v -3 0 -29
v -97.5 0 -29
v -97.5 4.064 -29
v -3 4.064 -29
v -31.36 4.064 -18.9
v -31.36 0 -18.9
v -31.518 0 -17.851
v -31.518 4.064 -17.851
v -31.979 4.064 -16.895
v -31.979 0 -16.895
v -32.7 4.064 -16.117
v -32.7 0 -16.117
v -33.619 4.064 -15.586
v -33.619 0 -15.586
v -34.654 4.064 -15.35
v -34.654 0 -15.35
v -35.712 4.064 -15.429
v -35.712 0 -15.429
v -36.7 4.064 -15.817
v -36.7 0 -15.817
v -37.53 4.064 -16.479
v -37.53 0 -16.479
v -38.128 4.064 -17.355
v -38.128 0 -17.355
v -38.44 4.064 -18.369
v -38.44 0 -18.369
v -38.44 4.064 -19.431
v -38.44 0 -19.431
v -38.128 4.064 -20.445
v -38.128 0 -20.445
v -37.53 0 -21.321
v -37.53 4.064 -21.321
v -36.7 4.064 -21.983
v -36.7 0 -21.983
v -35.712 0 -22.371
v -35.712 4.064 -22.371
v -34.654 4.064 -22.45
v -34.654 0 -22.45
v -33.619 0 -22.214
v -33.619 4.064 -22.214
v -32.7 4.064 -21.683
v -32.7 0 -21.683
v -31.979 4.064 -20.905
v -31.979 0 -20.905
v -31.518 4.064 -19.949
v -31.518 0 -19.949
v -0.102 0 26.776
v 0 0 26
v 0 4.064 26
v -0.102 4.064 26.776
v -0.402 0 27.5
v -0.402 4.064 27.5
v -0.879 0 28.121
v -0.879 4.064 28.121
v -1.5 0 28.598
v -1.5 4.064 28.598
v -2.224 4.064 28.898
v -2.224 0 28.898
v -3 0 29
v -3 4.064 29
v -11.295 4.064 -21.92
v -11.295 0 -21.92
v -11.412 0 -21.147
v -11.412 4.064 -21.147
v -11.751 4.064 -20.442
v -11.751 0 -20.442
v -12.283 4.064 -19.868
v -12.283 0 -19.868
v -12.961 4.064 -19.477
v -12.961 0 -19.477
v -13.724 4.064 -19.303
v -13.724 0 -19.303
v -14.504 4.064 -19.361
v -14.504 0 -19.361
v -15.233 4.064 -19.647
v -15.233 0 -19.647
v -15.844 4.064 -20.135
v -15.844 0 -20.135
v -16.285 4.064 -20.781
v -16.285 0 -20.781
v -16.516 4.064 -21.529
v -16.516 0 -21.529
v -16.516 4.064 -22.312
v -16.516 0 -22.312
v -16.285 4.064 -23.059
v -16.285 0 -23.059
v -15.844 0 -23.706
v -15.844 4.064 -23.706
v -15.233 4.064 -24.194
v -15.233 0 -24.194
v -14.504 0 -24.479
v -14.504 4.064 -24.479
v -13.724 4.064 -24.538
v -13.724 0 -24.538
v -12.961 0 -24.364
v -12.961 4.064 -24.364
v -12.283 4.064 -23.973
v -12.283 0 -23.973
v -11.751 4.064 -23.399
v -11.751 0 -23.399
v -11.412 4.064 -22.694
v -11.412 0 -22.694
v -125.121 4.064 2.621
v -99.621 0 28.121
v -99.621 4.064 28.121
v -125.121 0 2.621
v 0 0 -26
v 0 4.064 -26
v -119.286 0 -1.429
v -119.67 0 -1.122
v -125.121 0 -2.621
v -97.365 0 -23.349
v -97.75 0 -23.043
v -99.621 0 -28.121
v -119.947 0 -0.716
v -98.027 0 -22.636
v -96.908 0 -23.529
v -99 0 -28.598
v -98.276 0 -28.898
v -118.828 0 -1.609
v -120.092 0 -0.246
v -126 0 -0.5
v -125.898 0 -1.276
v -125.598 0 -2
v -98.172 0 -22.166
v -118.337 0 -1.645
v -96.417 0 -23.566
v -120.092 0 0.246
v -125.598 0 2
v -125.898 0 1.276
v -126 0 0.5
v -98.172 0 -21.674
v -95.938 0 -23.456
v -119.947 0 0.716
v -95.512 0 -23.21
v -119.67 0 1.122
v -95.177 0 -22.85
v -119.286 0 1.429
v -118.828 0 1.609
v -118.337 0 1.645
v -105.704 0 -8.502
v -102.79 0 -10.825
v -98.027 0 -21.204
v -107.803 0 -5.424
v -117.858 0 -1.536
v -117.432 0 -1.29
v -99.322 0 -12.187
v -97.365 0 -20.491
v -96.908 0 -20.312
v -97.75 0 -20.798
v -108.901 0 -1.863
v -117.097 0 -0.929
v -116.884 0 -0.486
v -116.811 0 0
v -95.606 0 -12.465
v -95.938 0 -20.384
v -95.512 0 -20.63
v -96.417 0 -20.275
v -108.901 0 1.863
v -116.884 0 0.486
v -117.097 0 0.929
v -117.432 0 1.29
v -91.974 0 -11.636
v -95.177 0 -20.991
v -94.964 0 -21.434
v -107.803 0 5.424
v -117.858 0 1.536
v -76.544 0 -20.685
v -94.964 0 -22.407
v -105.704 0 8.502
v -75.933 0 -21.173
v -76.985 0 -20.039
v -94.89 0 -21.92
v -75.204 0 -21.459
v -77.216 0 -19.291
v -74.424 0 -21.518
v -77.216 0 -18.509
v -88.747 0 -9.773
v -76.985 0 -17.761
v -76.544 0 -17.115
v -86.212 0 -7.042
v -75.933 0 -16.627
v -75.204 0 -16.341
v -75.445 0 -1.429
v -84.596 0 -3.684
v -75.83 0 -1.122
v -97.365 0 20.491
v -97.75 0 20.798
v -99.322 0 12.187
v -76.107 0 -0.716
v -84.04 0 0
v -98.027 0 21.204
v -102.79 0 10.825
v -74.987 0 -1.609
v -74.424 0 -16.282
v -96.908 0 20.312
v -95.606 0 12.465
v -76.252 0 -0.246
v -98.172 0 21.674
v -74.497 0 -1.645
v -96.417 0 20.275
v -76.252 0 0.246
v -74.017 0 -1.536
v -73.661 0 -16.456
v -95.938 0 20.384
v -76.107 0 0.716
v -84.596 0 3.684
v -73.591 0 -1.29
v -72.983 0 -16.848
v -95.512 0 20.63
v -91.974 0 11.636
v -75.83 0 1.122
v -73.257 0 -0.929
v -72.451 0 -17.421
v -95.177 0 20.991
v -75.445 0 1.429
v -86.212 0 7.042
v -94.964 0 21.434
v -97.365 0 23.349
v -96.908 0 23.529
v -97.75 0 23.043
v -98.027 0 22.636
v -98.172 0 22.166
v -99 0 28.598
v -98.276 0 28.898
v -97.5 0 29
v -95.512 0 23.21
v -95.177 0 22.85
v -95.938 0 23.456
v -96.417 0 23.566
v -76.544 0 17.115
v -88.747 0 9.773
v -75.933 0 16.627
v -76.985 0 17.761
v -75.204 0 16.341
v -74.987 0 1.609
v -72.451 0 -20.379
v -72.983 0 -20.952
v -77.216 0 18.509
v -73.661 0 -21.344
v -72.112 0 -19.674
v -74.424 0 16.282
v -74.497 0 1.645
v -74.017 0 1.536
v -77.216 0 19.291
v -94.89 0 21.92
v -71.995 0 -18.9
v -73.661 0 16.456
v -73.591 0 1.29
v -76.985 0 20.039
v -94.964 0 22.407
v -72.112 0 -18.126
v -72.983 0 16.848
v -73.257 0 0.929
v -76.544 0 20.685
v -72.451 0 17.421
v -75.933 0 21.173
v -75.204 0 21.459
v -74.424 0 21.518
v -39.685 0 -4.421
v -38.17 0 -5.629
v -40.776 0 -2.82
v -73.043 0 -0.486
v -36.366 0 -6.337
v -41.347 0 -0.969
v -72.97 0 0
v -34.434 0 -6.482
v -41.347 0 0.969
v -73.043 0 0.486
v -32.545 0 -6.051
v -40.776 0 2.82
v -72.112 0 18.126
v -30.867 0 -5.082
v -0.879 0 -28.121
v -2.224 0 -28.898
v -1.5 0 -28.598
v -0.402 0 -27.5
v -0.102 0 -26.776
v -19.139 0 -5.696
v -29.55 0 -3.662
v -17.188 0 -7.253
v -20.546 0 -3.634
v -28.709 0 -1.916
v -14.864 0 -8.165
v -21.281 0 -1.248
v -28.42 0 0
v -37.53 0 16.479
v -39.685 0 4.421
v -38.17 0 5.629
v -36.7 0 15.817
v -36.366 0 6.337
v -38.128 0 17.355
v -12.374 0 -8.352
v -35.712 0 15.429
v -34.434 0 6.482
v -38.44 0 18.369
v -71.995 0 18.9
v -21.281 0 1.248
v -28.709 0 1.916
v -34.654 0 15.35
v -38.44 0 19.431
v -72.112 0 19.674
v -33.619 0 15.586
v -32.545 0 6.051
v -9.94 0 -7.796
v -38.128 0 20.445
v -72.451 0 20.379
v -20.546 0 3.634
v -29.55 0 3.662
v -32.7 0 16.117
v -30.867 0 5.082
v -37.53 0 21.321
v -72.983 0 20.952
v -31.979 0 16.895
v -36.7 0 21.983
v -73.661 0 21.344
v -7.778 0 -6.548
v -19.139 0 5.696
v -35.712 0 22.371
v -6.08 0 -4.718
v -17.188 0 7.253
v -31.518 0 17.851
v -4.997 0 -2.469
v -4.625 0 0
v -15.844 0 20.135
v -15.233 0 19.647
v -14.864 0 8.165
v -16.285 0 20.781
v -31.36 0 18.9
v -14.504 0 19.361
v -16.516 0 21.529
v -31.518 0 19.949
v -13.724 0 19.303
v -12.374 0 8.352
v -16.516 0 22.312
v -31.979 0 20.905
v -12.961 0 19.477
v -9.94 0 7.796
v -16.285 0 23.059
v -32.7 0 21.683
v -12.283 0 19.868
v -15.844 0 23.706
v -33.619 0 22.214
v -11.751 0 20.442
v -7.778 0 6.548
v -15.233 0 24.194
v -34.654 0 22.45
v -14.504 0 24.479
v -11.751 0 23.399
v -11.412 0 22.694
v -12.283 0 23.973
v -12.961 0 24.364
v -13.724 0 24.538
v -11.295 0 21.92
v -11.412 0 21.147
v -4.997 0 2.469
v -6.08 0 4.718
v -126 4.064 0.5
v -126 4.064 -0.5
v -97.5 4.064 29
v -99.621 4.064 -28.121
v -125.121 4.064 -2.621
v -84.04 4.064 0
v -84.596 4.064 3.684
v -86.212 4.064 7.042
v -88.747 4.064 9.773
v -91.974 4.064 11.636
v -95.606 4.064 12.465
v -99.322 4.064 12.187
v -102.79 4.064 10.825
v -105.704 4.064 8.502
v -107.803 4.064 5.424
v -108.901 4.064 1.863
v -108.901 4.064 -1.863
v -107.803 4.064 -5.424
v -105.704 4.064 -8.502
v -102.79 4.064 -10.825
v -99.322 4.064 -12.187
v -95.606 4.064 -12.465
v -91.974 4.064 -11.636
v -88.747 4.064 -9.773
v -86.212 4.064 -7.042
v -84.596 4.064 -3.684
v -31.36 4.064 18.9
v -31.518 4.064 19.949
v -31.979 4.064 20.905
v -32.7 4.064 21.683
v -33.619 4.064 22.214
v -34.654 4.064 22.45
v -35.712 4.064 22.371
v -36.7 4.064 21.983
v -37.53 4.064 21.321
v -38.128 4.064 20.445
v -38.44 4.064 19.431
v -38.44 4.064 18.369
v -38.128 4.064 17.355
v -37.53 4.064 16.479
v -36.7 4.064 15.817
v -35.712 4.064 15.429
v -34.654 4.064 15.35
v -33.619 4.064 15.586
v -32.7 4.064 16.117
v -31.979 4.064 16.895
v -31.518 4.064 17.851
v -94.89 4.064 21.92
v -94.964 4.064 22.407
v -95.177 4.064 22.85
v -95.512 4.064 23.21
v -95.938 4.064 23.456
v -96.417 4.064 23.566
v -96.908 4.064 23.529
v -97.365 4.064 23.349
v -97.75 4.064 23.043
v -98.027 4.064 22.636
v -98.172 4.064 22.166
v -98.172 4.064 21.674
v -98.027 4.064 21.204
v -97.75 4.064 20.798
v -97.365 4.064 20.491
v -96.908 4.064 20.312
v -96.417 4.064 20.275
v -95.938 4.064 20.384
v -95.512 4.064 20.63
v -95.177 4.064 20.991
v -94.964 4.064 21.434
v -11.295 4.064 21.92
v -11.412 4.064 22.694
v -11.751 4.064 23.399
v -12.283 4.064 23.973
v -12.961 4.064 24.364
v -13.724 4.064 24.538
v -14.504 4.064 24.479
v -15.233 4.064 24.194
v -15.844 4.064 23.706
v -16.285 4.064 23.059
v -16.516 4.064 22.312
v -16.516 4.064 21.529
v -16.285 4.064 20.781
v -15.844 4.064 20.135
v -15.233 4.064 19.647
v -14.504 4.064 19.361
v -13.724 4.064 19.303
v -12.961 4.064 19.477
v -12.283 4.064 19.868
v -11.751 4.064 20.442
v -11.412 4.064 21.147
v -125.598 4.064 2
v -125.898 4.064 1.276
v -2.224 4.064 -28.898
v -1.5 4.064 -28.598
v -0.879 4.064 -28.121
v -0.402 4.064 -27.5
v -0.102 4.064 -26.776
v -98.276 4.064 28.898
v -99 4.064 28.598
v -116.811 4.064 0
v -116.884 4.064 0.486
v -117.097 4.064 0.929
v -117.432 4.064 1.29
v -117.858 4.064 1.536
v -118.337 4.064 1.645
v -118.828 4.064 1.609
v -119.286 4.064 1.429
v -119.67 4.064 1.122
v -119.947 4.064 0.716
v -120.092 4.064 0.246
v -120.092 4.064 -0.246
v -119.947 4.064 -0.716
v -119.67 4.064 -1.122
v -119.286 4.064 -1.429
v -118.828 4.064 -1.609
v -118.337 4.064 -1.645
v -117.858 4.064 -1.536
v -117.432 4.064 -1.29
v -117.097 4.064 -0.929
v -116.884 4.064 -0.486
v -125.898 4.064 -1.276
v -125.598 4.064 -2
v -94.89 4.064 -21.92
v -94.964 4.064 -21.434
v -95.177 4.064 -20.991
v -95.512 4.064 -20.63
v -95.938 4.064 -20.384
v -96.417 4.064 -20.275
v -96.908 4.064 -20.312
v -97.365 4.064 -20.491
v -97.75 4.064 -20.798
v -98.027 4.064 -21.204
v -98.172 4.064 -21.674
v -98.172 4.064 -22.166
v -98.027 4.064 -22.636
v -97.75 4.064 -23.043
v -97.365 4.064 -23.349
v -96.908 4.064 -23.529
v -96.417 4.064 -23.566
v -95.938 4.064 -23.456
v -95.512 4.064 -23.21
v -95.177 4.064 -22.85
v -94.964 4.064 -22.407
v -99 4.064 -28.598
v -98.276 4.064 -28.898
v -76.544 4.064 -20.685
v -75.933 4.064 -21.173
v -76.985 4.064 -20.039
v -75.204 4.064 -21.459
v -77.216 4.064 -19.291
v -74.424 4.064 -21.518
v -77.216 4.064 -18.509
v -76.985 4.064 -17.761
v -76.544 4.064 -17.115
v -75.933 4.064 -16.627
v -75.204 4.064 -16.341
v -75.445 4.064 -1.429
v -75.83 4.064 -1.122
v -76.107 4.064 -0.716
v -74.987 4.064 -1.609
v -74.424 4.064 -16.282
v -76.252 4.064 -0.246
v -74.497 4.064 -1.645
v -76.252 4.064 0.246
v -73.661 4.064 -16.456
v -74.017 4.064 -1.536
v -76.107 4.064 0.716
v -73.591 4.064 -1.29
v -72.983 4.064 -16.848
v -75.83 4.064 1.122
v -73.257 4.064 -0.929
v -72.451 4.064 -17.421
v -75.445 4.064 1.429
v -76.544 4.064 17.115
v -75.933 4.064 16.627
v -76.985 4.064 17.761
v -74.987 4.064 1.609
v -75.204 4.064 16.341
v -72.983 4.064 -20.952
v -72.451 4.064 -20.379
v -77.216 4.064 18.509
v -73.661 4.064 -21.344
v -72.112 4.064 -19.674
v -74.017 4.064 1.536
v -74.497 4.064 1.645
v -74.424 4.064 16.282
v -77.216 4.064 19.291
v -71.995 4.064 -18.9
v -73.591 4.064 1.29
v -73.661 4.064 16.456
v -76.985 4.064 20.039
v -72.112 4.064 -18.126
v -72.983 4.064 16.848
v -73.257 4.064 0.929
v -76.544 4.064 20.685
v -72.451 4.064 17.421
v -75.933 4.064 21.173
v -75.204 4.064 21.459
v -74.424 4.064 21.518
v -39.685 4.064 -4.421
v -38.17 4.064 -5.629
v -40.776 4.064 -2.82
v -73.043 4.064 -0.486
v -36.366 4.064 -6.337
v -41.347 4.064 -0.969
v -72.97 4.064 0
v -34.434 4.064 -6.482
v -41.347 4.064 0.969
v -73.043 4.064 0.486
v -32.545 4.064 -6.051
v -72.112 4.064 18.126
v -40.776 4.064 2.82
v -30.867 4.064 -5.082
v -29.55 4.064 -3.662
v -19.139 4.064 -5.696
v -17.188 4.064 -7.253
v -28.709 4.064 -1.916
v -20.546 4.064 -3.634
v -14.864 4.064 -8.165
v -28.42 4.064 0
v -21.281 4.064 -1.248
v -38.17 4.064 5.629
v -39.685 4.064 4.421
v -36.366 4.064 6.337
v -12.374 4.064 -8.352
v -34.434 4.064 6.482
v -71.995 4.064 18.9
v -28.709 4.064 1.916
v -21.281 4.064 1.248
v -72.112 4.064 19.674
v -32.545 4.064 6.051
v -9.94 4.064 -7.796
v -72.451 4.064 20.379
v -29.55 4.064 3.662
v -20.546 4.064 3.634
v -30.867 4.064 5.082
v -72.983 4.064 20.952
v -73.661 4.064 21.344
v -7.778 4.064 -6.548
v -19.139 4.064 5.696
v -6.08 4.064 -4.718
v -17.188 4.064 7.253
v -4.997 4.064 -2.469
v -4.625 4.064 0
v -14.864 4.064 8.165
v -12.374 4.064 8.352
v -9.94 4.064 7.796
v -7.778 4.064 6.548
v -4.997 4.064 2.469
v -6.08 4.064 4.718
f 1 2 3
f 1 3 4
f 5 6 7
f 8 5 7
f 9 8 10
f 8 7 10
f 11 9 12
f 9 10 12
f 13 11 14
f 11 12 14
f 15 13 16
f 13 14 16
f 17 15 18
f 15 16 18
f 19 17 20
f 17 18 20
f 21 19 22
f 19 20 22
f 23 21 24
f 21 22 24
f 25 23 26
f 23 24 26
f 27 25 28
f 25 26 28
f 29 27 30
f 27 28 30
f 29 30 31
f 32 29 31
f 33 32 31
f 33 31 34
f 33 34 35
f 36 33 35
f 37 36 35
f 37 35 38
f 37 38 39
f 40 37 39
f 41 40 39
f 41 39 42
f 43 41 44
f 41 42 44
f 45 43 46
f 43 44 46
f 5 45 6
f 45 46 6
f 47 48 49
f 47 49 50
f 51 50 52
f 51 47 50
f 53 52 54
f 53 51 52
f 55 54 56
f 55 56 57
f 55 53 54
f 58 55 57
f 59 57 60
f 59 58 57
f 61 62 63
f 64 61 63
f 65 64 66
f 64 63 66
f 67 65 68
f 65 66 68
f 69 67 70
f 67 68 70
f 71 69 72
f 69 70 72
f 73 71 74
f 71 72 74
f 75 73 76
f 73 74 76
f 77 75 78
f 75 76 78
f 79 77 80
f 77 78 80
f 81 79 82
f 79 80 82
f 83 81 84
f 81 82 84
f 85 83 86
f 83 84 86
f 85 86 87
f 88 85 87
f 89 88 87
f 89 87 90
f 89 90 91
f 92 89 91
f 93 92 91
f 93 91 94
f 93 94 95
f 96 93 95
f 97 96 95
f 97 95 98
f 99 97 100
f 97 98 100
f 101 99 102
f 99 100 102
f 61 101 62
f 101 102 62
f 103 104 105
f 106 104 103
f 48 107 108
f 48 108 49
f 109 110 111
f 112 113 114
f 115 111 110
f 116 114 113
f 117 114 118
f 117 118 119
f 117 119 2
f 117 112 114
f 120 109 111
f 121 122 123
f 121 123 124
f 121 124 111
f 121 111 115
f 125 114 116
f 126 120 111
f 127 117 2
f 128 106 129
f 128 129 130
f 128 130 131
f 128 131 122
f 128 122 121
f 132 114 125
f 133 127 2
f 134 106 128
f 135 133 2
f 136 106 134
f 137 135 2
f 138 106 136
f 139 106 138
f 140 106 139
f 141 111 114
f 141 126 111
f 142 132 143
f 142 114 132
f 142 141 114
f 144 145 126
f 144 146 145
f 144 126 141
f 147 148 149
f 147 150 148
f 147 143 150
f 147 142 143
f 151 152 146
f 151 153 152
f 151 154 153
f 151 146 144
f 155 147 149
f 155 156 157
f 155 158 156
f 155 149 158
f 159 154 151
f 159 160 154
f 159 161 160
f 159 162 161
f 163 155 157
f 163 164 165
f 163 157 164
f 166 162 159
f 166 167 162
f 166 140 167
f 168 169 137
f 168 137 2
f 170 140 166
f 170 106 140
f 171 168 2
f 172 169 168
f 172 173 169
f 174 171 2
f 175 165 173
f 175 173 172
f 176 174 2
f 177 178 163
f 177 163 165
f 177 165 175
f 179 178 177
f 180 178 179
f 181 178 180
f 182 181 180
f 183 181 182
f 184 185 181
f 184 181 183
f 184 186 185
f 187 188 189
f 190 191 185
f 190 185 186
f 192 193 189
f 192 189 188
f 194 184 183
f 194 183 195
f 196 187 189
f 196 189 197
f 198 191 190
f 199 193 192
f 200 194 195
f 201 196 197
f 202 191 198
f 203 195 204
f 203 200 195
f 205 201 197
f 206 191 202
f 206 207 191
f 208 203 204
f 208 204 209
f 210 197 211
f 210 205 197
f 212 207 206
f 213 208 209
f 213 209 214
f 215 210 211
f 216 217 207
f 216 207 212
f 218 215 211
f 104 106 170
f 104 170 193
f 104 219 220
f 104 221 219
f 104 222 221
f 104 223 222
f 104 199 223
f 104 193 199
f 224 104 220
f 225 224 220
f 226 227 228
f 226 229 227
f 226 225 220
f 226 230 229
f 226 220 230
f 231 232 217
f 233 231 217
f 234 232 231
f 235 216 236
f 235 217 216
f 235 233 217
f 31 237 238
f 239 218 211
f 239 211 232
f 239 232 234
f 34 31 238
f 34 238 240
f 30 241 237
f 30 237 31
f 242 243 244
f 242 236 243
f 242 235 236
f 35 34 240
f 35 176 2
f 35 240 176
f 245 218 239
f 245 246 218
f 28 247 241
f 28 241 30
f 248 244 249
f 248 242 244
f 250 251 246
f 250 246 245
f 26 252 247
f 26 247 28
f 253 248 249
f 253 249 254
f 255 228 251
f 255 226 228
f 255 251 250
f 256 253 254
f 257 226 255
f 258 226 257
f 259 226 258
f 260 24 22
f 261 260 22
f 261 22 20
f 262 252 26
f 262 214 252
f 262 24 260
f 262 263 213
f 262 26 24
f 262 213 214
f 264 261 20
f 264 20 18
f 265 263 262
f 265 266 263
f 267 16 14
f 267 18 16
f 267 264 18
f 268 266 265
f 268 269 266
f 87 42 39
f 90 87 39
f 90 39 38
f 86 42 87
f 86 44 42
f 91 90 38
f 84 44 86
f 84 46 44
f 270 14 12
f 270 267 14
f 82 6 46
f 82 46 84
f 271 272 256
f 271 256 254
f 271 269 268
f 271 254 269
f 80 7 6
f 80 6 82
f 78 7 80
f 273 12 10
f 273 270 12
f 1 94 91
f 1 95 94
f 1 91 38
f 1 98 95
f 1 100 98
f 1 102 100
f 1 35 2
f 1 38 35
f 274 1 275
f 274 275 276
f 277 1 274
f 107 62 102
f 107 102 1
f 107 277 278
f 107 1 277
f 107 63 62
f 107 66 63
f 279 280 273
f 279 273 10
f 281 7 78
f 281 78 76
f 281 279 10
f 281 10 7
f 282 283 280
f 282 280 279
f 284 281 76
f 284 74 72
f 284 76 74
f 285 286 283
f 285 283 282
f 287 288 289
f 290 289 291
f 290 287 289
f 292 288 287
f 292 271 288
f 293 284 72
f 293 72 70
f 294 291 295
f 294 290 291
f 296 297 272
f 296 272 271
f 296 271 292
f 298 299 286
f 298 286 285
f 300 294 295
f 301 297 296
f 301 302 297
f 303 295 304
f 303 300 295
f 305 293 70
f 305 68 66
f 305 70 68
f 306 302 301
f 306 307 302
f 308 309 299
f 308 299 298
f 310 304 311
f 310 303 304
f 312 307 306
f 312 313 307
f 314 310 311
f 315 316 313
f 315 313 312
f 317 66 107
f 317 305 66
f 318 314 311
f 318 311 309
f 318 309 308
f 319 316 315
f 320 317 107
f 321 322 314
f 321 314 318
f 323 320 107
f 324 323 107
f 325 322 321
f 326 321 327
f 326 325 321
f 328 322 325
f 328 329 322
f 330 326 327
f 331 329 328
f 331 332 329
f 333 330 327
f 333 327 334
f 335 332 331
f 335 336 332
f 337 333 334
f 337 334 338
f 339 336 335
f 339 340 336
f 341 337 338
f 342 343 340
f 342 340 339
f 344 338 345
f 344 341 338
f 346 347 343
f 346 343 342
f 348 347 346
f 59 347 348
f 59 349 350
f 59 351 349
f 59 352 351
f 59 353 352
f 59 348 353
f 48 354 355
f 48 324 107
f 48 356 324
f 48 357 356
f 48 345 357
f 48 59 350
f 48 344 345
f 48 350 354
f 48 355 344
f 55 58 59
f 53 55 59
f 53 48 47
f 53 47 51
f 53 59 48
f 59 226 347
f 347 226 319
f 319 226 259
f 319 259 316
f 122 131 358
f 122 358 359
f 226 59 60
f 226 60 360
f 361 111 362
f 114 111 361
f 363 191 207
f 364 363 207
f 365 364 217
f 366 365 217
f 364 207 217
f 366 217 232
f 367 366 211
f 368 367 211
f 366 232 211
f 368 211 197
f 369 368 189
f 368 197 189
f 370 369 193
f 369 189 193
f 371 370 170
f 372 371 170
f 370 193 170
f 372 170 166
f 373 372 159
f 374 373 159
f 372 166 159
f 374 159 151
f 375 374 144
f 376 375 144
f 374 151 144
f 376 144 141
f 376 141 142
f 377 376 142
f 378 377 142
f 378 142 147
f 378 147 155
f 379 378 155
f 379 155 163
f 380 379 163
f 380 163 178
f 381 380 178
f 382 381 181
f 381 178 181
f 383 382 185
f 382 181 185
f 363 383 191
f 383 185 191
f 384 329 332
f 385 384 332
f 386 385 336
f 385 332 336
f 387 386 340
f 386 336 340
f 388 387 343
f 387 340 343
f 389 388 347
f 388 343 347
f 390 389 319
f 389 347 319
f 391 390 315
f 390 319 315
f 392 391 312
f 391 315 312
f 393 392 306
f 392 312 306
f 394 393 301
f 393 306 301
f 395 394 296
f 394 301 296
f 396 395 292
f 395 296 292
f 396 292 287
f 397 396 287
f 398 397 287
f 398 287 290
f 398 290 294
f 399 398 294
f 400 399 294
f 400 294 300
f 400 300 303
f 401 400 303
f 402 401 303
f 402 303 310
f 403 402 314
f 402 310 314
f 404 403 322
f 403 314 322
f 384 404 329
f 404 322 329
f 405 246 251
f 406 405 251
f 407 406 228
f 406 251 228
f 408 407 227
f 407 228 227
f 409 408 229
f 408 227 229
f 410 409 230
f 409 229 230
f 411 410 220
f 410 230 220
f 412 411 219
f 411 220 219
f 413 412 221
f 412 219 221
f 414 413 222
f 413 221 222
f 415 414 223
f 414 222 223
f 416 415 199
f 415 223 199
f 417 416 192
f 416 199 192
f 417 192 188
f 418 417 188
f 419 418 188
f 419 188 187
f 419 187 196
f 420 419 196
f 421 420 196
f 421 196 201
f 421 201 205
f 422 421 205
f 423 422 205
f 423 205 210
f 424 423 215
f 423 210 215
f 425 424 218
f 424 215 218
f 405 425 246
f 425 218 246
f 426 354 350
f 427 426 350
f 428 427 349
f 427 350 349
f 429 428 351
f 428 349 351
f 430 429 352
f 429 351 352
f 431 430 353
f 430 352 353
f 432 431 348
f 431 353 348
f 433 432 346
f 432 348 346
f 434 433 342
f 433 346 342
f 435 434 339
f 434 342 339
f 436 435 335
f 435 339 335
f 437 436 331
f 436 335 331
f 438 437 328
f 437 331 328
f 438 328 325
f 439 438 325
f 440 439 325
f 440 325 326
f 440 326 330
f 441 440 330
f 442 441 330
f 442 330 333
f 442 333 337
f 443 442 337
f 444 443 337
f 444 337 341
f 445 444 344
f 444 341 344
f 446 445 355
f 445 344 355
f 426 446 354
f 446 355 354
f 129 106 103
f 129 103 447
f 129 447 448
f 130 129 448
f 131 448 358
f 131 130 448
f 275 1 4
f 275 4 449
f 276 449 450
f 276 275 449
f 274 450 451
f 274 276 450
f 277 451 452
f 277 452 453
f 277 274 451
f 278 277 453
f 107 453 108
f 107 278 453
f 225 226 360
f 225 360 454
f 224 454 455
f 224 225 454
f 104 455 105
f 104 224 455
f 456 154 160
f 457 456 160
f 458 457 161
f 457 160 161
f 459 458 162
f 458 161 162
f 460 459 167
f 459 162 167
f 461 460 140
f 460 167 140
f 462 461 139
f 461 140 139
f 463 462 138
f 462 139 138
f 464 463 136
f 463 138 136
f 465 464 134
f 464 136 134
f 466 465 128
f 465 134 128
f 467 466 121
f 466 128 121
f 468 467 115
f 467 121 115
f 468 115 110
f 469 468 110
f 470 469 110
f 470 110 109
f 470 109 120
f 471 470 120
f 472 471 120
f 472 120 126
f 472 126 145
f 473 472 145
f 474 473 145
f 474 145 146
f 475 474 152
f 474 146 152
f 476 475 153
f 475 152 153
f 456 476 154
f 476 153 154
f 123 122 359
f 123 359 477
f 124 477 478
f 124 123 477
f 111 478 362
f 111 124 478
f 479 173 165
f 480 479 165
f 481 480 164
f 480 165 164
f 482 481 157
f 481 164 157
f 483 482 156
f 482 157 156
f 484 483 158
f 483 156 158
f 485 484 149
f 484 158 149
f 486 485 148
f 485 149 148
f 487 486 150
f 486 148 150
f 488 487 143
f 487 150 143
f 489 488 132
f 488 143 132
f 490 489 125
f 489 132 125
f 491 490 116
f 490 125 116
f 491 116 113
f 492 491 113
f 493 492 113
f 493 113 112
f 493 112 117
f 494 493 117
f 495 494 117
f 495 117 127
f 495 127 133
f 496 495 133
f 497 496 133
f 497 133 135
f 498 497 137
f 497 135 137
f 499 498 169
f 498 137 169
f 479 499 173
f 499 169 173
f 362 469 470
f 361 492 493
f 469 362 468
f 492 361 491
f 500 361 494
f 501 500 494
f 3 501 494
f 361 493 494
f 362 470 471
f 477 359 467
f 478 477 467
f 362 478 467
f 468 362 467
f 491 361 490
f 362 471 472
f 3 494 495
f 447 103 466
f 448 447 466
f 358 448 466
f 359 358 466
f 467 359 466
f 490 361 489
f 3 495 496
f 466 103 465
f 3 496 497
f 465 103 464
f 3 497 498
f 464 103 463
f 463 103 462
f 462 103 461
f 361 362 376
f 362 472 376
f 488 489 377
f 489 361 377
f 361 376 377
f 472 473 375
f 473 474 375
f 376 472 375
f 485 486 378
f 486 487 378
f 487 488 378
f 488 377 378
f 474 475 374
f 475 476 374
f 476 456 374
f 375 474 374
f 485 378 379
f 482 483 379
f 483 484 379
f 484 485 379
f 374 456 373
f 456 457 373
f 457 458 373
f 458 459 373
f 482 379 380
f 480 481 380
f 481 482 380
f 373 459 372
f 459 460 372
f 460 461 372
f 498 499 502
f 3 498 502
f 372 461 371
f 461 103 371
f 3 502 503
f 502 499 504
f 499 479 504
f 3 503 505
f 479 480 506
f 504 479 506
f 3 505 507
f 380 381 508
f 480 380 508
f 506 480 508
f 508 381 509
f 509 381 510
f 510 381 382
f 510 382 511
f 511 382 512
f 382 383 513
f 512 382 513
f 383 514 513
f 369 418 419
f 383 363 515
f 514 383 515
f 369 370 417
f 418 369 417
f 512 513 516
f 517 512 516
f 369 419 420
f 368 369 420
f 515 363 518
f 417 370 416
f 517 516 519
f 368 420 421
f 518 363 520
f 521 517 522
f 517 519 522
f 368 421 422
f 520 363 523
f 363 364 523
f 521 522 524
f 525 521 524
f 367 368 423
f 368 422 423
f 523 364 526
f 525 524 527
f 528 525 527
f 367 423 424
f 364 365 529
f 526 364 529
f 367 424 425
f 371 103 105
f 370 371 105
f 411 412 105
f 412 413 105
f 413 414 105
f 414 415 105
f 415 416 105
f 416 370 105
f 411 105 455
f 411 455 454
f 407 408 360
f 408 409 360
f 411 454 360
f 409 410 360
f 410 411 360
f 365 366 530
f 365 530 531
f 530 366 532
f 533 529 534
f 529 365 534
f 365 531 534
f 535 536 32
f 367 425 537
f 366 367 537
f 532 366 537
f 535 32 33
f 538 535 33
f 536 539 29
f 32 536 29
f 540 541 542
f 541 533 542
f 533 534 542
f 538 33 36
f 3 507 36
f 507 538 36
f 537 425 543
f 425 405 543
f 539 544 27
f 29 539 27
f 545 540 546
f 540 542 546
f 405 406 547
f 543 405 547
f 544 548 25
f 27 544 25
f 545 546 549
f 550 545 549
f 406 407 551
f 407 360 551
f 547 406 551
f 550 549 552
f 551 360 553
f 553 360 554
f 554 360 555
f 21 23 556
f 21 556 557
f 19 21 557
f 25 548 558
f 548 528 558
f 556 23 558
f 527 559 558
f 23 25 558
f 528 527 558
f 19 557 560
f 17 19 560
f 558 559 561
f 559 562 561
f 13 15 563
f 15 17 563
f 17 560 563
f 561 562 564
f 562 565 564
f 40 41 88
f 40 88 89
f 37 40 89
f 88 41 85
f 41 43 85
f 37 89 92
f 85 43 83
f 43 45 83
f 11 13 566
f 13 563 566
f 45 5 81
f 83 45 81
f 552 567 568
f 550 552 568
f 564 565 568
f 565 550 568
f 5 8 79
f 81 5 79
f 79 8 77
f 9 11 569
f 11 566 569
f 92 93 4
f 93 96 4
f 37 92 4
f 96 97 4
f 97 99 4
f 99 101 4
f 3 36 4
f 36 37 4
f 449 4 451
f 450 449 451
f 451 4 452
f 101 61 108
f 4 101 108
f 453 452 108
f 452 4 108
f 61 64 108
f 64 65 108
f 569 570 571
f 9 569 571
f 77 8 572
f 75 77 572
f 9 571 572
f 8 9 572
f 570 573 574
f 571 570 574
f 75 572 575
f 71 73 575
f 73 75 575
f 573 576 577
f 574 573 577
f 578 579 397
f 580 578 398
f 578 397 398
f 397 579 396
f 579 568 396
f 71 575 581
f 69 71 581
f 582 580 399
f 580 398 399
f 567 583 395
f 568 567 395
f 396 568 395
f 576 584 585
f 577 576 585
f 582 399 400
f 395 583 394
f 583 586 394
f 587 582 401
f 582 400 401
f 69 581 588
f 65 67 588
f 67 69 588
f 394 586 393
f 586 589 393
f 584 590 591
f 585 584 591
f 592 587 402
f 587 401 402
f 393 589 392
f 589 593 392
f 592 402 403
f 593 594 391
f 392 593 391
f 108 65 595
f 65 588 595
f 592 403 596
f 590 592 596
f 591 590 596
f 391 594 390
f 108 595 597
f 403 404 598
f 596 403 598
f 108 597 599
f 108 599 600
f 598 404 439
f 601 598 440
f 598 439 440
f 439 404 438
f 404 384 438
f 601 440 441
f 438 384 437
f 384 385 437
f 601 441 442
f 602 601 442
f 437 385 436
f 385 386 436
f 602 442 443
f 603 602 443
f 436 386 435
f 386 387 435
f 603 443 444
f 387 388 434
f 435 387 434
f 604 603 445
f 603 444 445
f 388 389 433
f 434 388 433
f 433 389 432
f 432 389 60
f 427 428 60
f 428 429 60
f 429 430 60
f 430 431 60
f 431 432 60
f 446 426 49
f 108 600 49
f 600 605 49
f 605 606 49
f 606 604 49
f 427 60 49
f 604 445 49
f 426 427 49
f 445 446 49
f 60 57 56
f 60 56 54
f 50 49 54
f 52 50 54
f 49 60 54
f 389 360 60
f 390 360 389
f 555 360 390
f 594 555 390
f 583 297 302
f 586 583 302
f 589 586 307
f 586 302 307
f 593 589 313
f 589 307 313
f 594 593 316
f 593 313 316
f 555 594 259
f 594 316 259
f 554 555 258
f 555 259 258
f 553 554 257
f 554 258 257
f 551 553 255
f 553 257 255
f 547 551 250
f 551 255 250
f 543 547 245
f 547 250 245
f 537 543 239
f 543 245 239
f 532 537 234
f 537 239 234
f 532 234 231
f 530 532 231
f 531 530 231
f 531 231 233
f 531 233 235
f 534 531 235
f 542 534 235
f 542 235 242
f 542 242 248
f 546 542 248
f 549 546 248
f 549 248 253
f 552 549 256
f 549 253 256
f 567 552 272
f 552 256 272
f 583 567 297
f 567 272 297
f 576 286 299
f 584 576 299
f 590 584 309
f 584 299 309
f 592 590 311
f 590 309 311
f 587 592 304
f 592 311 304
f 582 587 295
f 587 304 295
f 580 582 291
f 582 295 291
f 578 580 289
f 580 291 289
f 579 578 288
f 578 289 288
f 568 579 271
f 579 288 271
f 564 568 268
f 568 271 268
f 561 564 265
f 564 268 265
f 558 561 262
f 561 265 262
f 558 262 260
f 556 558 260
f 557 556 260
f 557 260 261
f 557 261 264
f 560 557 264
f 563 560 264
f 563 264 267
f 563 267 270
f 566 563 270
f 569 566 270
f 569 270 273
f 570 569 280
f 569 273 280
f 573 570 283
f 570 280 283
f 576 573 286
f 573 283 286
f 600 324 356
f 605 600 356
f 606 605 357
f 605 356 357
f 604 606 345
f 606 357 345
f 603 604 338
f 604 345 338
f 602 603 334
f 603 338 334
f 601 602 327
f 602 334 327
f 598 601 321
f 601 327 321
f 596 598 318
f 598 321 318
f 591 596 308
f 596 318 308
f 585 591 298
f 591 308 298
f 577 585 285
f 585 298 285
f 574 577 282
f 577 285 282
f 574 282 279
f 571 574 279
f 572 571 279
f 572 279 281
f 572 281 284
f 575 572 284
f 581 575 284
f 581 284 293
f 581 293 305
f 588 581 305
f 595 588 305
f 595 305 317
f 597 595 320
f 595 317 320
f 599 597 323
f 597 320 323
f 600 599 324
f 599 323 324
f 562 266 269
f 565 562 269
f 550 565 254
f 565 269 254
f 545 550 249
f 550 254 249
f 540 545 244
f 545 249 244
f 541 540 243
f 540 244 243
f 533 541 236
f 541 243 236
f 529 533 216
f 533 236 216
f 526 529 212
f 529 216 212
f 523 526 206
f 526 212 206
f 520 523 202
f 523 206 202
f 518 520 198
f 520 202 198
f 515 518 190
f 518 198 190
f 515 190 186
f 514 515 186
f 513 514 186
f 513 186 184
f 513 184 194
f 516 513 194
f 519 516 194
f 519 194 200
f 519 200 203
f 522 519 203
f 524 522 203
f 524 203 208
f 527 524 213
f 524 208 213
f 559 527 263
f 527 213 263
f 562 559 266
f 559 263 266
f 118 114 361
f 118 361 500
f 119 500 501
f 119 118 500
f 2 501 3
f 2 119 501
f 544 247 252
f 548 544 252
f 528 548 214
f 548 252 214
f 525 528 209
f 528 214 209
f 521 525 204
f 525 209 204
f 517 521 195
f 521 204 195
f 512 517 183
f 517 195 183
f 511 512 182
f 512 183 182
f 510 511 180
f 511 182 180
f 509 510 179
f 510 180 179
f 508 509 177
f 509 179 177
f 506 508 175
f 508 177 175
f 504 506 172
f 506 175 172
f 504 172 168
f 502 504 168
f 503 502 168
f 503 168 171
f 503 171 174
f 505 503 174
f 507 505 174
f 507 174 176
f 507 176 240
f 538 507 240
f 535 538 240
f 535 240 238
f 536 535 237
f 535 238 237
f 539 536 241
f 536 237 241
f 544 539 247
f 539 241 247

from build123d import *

# Parameters (mm, degrees)
SKETCH1_R           = 8.375
SKETCH1_R_2         = 3.56
SKETCH1_R_3         = 2.625
SKETCH1_R_4         = 12.5
SKETCH1_R_5         = 1.65
SKETCH1_R_6         = 6.5
BOSS_EXTRUDE1_DEPTH = 4.064


with BuildPart() as part:
    # Sketch1 → Boss-Extrude1 (new body)
    with BuildSketch(Plane.XZ):
        with BuildLine():
            Line((0, -26), (0, 26))
            ThreePointArc((0, 26), (-0.878679656, 28.121320344), (-3, 29))
            Line((-3, 29), (-97.5, 29))
            ThreePointArc((-97.5, 29), (-98.648050297, 28.771638598), (-99.621320344, 28.121320344))
            Line((-99.621320344, 28.121320344), (-125.121320344, 2.621320344))
            ThreePointArc((-125.121320344, 2.621320344), (-125.771638598, 1.648050297), (-126, 0.5))
            Line((-126, 0.5), (-126, -0.5))
            ThreePointArc((-126, -0.5), (-125.771638598, -1.648050297), (-125.121320344, -2.621320344))
            Line((-125.121320344, -2.621320344), (-99.621320344, -28.121320344))
            ThreePointArc((-99.621320344, -28.121320344), (-98.648050297, -28.771638598), (-97.5, -29))
            Line((-97.5, -29), (-3, -29))
            ThreePointArc((-3, -29), (-0.878679656, -28.121320344), (0, -26))
        make_face()
        with Locations((-13, 0)):
            Circle(SKETCH1_R, mode=Mode.SUBTRACT)
        with Locations((-34.92008574, 18.9)):
            Circle(SKETCH1_R_2, mode=Mode.SUBTRACT)
        with Locations((-74.62008574, 18.9)):
            Circle(SKETCH1_R_3, mode=Mode.SUBTRACT)
        with Locations((-34.92008574, -18.9)):
            Circle(SKETCH1_R_2, mode=Mode.SUBTRACT)
        with Locations((-74.62008574, -18.9)):
            Circle(SKETCH1_R_3, mode=Mode.SUBTRACT)
        with Locations((-96.540395956, 0)):
            Circle(SKETCH1_R_4, mode=Mode.SUBTRACT)
        with Locations((-74.62008574, 0)):
            Circle(SKETCH1_R_5, mode=Mode.SUBTRACT)
        with Locations((-118.460706173, 0)):
            Circle(SKETCH1_R_5, mode=Mode.SUBTRACT)
        with Locations((-96.540395956, -21.920310217)):
            Circle(SKETCH1_R_5, mode=Mode.SUBTRACT)
        with Locations((-96.540395956, 21.920310217)):
            Circle(SKETCH1_R_5, mode=Mode.SUBTRACT)
        with Locations((-13.92008574, 21.920310217)):
            Circle(SKETCH1_R_3, mode=Mode.SUBTRACT)
        with Locations((-13.92008574, -21.920310217)):
            Circle(SKETCH1_R_3, mode=Mode.SUBTRACT)
        with Locations((-34.92008574, 0)):
            Circle(SKETCH1_R_6, mode=Mode.SUBTRACT)
    extrude(amount=-BOSS_EXTRUDE1_DEPTH)


solid = part.part
